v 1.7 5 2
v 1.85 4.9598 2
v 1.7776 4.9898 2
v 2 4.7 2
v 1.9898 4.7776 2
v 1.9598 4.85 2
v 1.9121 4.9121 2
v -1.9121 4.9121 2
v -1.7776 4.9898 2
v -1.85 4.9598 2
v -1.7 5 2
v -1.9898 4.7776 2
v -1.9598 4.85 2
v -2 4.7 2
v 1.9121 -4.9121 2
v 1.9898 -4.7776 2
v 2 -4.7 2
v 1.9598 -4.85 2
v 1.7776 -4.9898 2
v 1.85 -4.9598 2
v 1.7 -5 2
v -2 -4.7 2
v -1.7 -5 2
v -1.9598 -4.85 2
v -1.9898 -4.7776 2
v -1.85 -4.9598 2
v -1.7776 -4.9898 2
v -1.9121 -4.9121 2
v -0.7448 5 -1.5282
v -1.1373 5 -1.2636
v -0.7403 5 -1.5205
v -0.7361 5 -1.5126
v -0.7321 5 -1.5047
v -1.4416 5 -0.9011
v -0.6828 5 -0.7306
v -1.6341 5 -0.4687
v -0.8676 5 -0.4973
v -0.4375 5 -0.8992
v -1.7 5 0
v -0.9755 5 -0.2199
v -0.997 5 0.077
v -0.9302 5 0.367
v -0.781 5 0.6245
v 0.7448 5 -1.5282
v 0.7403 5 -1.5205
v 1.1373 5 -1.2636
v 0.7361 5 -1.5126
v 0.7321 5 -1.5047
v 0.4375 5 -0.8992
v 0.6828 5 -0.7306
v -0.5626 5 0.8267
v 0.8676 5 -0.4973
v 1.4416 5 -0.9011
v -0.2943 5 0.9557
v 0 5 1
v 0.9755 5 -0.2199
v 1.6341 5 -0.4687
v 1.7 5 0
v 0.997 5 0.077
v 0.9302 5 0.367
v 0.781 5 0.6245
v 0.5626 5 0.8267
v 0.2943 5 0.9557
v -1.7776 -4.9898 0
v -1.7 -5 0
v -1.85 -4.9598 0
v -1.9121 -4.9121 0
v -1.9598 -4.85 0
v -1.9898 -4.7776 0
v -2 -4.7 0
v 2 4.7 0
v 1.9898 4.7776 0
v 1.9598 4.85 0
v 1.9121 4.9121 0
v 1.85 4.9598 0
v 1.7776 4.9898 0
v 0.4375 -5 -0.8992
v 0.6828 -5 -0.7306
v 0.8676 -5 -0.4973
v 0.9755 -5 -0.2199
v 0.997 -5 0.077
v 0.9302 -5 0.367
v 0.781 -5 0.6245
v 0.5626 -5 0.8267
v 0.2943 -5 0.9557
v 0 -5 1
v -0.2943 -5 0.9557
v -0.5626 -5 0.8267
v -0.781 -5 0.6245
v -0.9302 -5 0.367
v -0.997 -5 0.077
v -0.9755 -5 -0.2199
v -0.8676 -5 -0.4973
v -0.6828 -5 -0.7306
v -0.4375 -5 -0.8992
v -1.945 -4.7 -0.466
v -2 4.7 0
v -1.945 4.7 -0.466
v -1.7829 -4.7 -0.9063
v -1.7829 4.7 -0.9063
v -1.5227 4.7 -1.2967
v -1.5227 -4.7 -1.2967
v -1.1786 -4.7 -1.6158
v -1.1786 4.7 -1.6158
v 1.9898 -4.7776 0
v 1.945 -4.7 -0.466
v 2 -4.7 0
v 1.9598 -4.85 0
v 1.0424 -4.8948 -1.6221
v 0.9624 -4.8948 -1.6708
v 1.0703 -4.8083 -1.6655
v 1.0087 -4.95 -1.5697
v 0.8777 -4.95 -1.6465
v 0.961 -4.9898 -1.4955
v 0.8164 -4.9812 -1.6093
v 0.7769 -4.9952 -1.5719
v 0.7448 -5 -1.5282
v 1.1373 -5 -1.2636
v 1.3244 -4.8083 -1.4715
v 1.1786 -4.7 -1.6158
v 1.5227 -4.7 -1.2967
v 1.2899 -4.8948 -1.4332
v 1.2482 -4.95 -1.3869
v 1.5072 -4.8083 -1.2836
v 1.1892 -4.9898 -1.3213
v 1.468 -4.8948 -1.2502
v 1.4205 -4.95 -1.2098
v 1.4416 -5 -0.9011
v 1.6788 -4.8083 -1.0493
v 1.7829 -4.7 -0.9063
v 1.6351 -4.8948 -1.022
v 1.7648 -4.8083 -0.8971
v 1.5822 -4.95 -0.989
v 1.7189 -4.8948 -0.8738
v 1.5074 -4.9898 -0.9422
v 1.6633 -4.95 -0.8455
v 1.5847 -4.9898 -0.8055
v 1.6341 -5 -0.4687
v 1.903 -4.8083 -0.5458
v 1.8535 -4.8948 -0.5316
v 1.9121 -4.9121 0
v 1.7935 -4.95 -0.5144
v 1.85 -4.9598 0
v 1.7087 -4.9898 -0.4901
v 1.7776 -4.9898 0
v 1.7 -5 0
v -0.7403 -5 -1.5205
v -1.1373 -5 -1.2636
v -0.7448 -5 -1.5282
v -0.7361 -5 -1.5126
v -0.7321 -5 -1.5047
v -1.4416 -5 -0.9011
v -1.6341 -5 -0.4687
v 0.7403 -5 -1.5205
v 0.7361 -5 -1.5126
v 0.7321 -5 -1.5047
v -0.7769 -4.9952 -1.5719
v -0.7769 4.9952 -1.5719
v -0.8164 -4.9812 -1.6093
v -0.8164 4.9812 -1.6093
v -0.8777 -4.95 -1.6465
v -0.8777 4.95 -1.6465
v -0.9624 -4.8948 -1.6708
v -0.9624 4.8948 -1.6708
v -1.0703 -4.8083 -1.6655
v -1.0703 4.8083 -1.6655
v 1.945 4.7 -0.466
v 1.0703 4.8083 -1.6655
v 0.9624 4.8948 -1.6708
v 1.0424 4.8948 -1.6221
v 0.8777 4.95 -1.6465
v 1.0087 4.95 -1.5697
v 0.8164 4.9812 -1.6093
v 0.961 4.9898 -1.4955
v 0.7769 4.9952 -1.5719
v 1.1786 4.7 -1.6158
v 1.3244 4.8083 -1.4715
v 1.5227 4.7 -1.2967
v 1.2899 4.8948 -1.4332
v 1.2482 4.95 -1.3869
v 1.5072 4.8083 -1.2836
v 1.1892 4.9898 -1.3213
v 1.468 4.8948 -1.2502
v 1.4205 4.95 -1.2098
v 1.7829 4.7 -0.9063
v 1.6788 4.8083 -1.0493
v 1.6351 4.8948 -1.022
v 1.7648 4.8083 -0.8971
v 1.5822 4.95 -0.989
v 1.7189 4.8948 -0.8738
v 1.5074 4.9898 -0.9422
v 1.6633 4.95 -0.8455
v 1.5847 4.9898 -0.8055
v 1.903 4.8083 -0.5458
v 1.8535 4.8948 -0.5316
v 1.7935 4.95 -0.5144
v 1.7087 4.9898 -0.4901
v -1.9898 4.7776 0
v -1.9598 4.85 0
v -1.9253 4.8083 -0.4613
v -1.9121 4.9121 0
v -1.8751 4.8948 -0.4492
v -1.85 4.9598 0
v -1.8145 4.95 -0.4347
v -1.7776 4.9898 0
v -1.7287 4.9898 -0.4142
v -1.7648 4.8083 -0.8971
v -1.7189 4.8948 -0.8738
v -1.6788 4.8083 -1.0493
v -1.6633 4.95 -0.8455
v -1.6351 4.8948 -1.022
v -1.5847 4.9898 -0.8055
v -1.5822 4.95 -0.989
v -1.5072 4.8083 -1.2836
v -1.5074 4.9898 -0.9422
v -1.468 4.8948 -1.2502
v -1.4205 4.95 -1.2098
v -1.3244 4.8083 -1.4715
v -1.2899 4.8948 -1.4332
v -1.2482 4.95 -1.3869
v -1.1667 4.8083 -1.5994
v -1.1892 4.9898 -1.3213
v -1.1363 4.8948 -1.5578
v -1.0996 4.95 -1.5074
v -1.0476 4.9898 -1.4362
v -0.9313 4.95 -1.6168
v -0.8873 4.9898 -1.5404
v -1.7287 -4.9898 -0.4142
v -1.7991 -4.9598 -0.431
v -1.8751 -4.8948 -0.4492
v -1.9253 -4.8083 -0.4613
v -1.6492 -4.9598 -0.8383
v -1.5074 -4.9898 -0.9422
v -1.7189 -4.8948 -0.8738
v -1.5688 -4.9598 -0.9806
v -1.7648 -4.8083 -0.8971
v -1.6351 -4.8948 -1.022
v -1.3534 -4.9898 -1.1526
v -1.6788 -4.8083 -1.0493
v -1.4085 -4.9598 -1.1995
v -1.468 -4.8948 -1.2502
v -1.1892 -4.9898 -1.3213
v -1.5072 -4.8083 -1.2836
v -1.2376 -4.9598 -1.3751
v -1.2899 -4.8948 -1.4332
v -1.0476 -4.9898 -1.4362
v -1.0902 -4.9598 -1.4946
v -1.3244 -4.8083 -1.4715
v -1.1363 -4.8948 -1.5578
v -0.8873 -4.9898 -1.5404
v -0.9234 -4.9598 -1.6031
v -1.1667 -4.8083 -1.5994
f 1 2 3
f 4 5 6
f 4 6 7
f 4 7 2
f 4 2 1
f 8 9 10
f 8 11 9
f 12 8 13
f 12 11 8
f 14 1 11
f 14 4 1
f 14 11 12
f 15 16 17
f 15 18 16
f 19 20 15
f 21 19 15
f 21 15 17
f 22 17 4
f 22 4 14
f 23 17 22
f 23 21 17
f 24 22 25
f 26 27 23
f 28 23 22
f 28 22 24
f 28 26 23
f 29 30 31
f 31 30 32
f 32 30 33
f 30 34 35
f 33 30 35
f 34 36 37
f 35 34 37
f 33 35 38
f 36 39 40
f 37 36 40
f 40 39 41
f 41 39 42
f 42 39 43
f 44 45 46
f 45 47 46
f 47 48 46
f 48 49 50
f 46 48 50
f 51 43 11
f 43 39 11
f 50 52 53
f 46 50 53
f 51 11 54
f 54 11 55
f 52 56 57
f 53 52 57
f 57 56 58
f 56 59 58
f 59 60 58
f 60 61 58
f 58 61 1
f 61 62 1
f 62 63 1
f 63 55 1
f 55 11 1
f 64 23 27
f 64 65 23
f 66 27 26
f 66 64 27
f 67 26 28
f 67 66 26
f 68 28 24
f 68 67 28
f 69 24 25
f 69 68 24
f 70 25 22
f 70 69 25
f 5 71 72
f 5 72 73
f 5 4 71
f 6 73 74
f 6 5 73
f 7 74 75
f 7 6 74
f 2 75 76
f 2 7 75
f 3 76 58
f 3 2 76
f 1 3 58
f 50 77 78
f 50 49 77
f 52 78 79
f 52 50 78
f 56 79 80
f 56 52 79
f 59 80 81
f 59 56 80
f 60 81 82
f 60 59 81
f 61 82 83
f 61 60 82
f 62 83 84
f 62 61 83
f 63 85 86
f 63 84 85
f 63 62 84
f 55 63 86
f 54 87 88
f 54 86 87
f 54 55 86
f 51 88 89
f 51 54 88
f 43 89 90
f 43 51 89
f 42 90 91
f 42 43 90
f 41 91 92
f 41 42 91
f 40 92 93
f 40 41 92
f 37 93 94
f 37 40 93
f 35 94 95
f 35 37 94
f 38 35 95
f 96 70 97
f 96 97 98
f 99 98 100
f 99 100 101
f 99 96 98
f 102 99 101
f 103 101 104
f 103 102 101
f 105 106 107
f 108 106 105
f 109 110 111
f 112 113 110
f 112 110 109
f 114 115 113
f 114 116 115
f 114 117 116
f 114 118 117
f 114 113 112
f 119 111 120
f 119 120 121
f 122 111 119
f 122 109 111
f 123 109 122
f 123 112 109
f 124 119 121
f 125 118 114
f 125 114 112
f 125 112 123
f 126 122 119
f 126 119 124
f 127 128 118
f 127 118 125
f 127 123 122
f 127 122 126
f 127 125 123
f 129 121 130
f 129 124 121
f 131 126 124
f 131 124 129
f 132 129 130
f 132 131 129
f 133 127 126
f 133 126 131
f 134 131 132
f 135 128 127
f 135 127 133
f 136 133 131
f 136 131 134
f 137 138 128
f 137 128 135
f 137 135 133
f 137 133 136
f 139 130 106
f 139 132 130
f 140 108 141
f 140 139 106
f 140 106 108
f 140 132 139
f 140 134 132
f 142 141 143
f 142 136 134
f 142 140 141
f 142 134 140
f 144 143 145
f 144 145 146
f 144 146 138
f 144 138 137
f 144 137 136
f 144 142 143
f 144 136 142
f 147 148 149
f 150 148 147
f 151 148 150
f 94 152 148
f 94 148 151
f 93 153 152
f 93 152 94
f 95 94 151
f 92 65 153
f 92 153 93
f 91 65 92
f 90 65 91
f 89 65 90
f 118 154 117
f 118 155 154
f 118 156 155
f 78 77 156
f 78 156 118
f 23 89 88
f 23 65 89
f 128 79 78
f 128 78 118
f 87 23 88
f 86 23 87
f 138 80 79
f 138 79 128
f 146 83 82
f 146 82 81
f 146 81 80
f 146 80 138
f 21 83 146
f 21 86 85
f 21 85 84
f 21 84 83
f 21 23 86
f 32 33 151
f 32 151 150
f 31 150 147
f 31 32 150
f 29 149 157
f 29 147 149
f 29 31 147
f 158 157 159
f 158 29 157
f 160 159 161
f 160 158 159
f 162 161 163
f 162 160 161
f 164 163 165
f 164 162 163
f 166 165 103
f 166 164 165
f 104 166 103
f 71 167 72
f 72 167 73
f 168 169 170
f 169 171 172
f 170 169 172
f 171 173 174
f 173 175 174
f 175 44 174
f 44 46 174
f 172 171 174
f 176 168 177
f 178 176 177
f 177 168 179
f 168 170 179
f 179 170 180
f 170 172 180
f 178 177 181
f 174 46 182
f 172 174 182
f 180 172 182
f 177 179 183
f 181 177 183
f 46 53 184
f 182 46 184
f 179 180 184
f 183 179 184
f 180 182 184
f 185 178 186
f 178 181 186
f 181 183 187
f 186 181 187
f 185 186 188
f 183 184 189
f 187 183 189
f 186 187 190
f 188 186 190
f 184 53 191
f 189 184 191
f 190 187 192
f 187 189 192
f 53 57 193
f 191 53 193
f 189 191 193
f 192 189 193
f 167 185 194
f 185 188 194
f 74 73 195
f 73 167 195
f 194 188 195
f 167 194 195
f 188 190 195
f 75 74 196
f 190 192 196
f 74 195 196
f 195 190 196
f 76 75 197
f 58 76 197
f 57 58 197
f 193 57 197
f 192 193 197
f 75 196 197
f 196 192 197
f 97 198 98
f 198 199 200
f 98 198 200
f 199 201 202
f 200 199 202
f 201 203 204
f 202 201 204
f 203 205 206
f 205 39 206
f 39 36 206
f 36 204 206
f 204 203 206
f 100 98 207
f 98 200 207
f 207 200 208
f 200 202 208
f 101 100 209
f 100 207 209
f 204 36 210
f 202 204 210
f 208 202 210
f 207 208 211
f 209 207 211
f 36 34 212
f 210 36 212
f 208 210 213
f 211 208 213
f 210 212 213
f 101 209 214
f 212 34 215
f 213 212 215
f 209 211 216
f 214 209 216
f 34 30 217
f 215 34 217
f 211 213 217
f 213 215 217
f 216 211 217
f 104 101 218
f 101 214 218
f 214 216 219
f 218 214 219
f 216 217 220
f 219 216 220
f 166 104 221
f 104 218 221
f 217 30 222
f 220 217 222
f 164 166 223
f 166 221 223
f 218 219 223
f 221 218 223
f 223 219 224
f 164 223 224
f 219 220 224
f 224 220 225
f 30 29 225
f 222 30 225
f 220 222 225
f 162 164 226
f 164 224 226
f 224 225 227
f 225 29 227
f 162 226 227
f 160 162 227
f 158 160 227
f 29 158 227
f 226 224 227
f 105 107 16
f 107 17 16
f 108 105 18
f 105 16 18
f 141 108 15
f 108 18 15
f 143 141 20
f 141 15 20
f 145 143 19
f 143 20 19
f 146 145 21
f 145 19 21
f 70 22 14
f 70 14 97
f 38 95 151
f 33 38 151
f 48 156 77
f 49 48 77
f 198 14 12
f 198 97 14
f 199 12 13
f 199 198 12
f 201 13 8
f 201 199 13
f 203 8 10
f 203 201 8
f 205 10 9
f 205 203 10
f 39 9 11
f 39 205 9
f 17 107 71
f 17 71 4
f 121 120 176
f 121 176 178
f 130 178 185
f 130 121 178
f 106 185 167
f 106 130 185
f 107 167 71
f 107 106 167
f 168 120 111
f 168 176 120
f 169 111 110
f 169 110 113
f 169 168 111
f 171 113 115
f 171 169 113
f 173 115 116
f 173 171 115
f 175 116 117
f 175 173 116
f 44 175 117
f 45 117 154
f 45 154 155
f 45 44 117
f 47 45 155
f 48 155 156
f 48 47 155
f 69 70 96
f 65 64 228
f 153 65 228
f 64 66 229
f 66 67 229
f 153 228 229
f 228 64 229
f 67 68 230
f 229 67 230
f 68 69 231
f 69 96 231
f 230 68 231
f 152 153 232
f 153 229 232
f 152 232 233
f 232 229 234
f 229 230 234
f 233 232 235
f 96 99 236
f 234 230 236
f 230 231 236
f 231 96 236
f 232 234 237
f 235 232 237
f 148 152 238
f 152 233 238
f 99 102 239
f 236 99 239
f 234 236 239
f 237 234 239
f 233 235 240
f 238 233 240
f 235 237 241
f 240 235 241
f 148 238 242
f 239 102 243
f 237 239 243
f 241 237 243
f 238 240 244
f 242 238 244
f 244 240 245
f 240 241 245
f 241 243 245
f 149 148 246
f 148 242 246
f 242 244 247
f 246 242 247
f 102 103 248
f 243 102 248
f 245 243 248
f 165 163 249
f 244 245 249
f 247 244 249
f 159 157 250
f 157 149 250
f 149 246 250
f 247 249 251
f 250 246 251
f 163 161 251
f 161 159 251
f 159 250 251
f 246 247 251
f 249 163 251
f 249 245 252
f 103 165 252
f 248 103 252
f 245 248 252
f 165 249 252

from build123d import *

# Parameters (mm, degrees)
F0_R     = 1
F1_DEPTH = 5
F3_DEPTH = 10.001
F4_R     = 0.3


with BuildPart() as f1:
    # F0 (on Front) → F1 (new body, symmetric)
    with BuildSketch(Plane.XZ):
        with BuildLine():
            Line((-2, 2), (-2, 0))
            ThreePointArc((-2, 0), (0, -2), (2, 0))
            Line((2, 0), (2, 2))
            Line((2, 2), (0, 2))
            Line((0, 2), (-2, 2))
        make_face()
        Circle(F0_R, mode=Mode.SUBTRACT)
    extrude(amount=F1_DEPTH, both=True)

    # F2 (on face) → F3 (cut, through all)
    with BuildSketch(Plane.XZ.offset(5)):
        with BuildLine():
            Line((0.875, -1.7984368212), (0, 0))
            Line((0, 0), (-0.875, -1.7984368212))
            ThreePointArc((-0.875, -1.7984368212), (0, -2), (0.875, -1.7984368212))
        make_face()
    extrude(amount=-F3_DEPTH, mode=Mode.SUBTRACT)

    # F4
    f4_edges = [f1.edges().sort_by_distance(p)[0] for p in [
        (-0.875, 0, -1.798437),
        (0.875, 0, -1.798437),
        (-1.695582, -5, -1.06066),
        (-2, -5, 1),
        (1.695582, -5, -1.06066),
        (1.695582, 5, -1.06066),
        (2, 5, 1),
        (-1.695582, 5, -1.06066),
        (-2, 5, 1),
    ]]
    fillet(f4_edges, radius=F4_R)


solid = f1.part
